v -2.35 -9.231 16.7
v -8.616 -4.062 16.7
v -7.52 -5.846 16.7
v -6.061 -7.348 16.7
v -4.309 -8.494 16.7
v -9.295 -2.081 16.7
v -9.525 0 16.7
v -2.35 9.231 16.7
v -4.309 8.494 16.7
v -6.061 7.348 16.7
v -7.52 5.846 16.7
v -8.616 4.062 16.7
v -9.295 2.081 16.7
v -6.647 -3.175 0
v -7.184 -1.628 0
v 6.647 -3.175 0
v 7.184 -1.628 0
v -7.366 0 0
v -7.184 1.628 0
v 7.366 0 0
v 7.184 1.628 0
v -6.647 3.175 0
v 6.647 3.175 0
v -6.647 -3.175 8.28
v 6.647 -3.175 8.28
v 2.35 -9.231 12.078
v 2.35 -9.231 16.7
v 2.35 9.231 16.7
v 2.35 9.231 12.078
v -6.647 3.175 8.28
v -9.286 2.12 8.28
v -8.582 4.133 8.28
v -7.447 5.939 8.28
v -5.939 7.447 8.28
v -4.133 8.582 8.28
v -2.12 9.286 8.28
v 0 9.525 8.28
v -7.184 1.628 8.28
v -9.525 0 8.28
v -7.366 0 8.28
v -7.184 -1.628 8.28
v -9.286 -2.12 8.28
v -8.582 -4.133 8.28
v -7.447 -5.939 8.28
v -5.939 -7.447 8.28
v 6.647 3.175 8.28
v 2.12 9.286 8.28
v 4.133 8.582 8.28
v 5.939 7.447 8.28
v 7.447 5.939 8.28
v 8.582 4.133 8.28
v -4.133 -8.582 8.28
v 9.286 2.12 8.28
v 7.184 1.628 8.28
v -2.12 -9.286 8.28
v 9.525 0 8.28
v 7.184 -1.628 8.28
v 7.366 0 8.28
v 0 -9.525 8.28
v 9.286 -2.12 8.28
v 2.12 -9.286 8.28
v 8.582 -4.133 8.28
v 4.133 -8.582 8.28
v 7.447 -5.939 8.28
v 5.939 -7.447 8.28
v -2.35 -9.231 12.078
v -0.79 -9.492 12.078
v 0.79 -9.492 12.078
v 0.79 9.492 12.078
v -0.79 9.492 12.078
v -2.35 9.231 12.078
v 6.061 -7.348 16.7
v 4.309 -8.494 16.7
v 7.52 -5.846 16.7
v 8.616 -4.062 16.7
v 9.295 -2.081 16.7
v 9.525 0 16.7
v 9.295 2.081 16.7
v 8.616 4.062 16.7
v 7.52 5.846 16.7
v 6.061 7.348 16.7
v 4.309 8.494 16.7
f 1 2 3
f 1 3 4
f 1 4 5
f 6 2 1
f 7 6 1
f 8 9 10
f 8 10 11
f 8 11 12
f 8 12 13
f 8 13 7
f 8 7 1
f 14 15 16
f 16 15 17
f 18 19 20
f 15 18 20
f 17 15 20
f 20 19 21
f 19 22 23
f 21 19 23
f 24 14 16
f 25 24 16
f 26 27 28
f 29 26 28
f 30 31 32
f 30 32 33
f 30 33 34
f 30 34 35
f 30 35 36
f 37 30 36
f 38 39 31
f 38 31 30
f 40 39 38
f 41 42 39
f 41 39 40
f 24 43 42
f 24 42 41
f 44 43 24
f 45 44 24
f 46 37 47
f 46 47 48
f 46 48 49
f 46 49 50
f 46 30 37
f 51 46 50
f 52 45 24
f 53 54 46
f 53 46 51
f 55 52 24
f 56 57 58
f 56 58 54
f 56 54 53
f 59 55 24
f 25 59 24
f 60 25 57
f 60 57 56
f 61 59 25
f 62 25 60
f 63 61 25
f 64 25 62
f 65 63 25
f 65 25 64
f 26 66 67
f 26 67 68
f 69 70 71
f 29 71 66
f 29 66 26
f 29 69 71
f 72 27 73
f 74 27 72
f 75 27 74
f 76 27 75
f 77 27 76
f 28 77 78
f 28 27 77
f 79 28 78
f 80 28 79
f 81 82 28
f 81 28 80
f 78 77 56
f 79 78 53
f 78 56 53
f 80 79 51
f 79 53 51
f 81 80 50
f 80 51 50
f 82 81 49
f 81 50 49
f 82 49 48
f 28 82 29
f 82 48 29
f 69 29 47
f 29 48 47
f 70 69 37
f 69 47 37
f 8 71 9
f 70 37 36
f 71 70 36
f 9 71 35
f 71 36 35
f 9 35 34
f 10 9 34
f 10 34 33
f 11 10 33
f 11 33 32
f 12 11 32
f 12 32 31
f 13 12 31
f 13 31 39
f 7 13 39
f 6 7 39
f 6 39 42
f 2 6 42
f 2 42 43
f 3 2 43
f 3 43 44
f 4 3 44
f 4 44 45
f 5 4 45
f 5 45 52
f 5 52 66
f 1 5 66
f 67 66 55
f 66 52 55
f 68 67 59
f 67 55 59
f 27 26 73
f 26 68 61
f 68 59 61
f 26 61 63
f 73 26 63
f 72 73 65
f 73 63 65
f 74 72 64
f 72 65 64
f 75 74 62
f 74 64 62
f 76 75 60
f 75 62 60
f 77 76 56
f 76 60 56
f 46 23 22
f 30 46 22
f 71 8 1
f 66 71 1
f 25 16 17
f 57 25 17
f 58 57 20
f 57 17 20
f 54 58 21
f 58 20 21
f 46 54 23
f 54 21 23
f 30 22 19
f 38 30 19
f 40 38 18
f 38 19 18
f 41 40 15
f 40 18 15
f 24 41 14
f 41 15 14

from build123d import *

# Parameters (mm, degrees)
F0_R     = 9.525
F1_DEPTH = 16.7005
F3_DEPTH = 4.6228
F4_R     = 9.525
F5_DEPTH = 8.2804


with BuildPart() as f1:
    # F0 (on Top) → F1 (new body)
    with BuildSketch(Plane.XY):
        Circle(F0_R)
    extrude(amount=F1_DEPTH)

    # F2 (on face) → F3 (cut)
    with BuildSketch(Plane.XY.offset(16.7005)):
        with BuildLine():
            ThreePointArc((2.3495, 9.230681), (0, 9.525), (-2.3495, 9.230681))
            Line((-2.3495, 9.230681), (-2.3495, -9.230681))
            ThreePointArc((-2.3495, -9.230681), (0, -9.525), (2.3495, -9.230681))
            Line((2.3495, -9.230681), (2.3495, 9.230681))
        make_face()
    extrude(amount=-F3_DEPTH, mode=Mode.SUBTRACT)

    # F4 (on face) → F5 (cut)
    with BuildSketch(Plane(origin=(0, 0, 0), x_dir=(1, 0, 0), z_dir=(0, 0, -1))):
        Circle(F4_R)
        with BuildLine():
            ThreePointArc((-6.646603, -3.175), (-7.366, 0), (-6.646603, 3.175))
            Line((-6.646603, 3.175), (6.646603, 3.175))
            ThreePointArc((6.646603, 3.175), (7.366, 0), (6.646603, -3.175))
            Line((6.646603, -3.175), (-6.646603, -3.175))
        make_face(mode=Mode.SUBTRACT)
    extrude(amount=-F5_DEPTH, mode=Mode.SUBTRACT)


solid = f1.part
